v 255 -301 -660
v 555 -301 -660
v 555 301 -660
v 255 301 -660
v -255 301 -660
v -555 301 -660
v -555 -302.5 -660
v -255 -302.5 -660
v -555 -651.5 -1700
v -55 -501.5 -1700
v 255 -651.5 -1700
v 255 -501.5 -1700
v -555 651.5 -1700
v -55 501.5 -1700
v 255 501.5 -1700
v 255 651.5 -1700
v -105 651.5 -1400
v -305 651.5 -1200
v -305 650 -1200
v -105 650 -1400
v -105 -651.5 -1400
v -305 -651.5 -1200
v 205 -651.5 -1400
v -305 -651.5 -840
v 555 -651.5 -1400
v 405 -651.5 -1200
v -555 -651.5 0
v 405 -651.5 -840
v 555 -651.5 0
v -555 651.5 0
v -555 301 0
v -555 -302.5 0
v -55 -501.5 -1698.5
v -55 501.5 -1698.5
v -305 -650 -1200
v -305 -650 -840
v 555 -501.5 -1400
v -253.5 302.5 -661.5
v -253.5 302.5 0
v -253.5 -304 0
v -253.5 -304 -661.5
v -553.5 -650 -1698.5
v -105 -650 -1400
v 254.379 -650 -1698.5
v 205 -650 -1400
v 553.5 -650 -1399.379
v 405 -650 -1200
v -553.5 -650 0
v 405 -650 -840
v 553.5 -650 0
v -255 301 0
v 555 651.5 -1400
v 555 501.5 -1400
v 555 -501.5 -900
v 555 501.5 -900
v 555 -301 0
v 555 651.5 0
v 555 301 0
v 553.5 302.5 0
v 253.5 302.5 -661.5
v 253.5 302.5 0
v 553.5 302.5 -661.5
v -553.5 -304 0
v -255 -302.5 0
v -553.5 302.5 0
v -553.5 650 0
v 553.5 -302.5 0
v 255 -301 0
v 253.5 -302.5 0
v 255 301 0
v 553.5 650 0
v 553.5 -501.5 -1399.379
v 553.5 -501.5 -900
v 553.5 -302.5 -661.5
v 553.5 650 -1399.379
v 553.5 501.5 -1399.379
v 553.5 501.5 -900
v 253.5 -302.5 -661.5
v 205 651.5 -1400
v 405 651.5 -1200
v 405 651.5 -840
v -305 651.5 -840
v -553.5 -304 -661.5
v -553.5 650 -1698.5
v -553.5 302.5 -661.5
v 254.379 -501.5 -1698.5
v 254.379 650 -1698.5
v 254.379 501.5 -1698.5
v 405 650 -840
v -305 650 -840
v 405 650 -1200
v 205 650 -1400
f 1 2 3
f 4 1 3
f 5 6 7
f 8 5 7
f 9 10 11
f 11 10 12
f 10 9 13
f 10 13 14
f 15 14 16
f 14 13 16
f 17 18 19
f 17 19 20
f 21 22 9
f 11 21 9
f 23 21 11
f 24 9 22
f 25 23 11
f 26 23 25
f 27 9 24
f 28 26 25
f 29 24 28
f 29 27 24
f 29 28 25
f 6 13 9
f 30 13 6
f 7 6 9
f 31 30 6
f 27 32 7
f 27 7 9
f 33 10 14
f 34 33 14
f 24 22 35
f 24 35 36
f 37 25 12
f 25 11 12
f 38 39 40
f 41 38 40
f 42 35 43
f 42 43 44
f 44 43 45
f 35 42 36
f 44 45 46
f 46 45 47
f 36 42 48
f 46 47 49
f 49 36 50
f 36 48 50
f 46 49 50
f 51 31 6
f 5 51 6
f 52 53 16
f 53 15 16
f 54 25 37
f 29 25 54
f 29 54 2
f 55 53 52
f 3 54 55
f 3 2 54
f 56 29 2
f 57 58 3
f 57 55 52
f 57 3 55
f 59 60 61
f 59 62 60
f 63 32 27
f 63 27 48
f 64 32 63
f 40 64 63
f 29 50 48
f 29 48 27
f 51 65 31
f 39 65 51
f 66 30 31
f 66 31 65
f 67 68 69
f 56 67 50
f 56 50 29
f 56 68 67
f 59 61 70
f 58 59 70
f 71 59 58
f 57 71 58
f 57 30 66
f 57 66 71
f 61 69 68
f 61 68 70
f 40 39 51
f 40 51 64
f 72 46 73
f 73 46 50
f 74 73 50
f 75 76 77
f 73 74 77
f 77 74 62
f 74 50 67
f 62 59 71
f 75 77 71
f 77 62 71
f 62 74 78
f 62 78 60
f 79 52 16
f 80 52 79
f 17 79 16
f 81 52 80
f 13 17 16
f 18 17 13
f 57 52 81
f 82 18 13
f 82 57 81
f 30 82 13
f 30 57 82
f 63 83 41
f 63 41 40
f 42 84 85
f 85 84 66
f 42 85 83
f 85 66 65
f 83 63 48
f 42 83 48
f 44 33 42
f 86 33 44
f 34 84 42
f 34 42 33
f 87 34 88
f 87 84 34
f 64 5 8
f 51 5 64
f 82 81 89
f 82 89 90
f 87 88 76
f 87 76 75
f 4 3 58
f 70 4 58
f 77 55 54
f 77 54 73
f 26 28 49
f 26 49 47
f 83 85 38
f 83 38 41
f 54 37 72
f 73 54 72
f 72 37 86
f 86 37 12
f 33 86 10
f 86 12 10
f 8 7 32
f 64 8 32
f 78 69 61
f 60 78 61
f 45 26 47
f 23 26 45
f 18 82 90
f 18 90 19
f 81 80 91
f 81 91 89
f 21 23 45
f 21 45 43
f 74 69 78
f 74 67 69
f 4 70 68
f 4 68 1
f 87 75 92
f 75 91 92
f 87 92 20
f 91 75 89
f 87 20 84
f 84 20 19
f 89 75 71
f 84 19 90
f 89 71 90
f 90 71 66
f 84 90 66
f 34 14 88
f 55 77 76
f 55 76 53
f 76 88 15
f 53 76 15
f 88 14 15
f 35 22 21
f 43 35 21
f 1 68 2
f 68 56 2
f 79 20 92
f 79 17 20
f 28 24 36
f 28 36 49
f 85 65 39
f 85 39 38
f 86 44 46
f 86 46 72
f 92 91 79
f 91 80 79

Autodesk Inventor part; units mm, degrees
ref_plane "YZ Plane" through (0, 0, 0) normal (1, 0, 0) x (0, 1, 0)
ref_plane "XZ Plane" through (0, 0, 0) normal (0, 1, 0) x (-1, 0, 0)
ref_plane "XY Plane" through (0, 0, 0) normal (0, 0, 1) x (1, 0, 0)
sketch "Esboço1" plane through (0, 0, 0) normal (0, 0, 1) x (1, 0, 0)
  line L0 (555, 651.5) -> (-555, 651.5)
  line L1 (-555, 651.5) -> (-555, -651.5)
  line L2 (-555, -651.5) -> (555, -651.5)
  line L3 (555, -651.5) -> (555, 651.5)
  point P0 (0, 0)
  point P1 (555, 0)
  point P2 (0, 651.5)
  dimension "d11" = 1110
  dimension "d12" = 1303
extrude "Extrusão1" add sketch "Esboço1" against normal blind 1700
sketch "Esboço3" plane through (-555, -651.5, 0) normal (0, -1, 0) x (1, 0, 0)
  line L0 (960, -1400) -> (250, -1400)
  line L1 (250, -1400) -> (250, -840)
  line L2 (250, -840) -> (960, -840)
  line L3 (960, -840) -> (960, -1400)
  line L4 (1110, 0) -> (1110, -1700) construction
  line L5 (0, 0) -> (0, -1700) construction
  line L6 (1110, -1700) -> (0, -1700) projected
  line L7 (1110, 0) -> (0, 0) construction
  point P0 (555, 0)
  dimension "d2" = 150
  dimension "d3" = 250
  dimension "d4" = 300
  dimension "d10" = 560
  dimension "d17" = 840
extrude "Extrusão2" cut sketch "Esboço3" against normal through all
chamfer "Chanfro2" distance 300 angle 45 1 edges at (555, 0, -1700)
chamfer "Chanfro1" distance 200 angle 45 2 edges at (-305, 0, -1400) (405, 0, -1400)
sketch "Esboço4" plane through (555, -651.5, 0) normal (1, 0, 0) x (0, 0, -1)
  line L0 (0, 1303) -> (0, 0) projected
  line L1 (660, 952.5) -> (0, 952.5)
  line L2 (0, 952.5) -> (0, 350.5)
  line L3 (0, 350.5) -> (660, 350.5)
  line L4 (660, 350.5) -> (660, 952.5)
  line L5 (0, 1303) -> (1400, 1303) projected
  line L6 (0, 0) -> (1400, 0) projected
  point P0 (0, 651.5)
  point P1 (0, 952.5)
  dimension "d19" = 350.5
  dimension "d20" = 350.5
  dimension "d21" = 660
  dimension "d22" = 602
extrude "Extrusão3" cut sketch "Esboço4" against normal blind 300
sketch "Esboço6" plane through (-555, -651.5, 0) normal (-1, 0, 0) x (0, 0, 1)
  line L0 (-660, 349) -> (0, 349)
  line L1 (0, 349) -> (0, 954)
  line L2 (0, 954) -> (-660, 954)
  line L3 (-660, 954) -> (-660, 349)
  line L4 (0, 1303) -> (0, 0) projected
  line L5 (0, 952.5) -> (-660, 952.5) projected
  point P0 (0, 651.5)
  point P1 (0, 651.5)
  dimension "d30" = 660
  dimension "d31" = 660
  dimension "d32" = 605
extrude "Extrusão5" cut sketch "Esboço6" against normal blind 300 contours L3 L5 L1 L0
shell "Casca1" thickness 1.5 removed faces 7 at (85, 534.6667, 0) at (168.3333, -217.1667, -840) at (-305, 217.1667, -960) at (-238.3333, -217.1667, -1266.6667) at (-1.6667, -217.1667, -1400) at (405, -217.1667, -1080) at (271.6667, -217.1667, -1333.3333)
sketch "Esboço5" plane through (0, 0, -1700) normal (0, 0, -1) x (-1, 0, 0)
  line L0 (55, 501.5) -> (-555, 501.5)
  line L1 (-555, 501.5) -> (-555, -501.5)
  line L2 (-555, -501.5) -> (55, -501.5)
  line L3 (55, -501.5) -> (55, 501.5)
  line L4 (-255, 651.5) -> (-555, 651.5) construction
  line L5 (-255, -651.5) -> (555, -651.5) construction
  line L6 (-555, 651.5) -> (-555, -651.5) construction
  line L7 (555, -651.5) -> (555, 651.5) construction
  line L8 (555, 651.5) -> (-555, 651.5)
  line L9 (-555, 651.5) -> (-555, -651.5)
  line L10 (-555, -651.5) -> (555, -651.5)
  line L11 (555, -651.5) -> (555, 651.5)
  point P0 (0, 0)
  dimension "d25" = 150
  dimension "d26" = 150
  dimension "d27" = 500
extrude "Extrusão4" cut sketch "Esboço5" against normal blind 800 contours L3 L2 L1 L0
sketch "Esboço7" plane through (255, -651.5, 0) normal (1, 0, 0) x (0, 0, -1)
  line L0 (661.5, 349) -> (0, 349) construction
  line L1 (440, 952.5) -> (435, 952.5)
  line L2 (435, 952.5) -> (435, 349)
  line L3 (435, 349) -> (440, 349)
  line L4 (440, 349) -> (440, 952.5)
  line L5 (0, 952.5) -> (660, 952.5) construction
  line L6 (0, 350.5) -> (0, 952.5) construction
  line L7 (660, 350.5) -> (0, 350.5) construction
  line L8 (660, 952.5) -> (660, 350.5) construction
  line L9 (0, 952.5) -> (660, 952.5) projected
  line L10 (215, 952.5) -> (210, 952.5)
  line L11 (210, 952.5) -> (210, 350.5)
  line L12 (210, 350.5) -> (215, 350.5)
  line L13 (215, 350.5) -> (215, 952.5)
  point P0 (0, 651.5)
  point P1 (437.5, 952.5)
  dimension "d35" = 5
  dimension "d36" = 220
  dimension "d37" = 220
equation "\"d20\" = d19"
equation "\"d26\" = d25"
equation "\"d36\" = d37"
properties part number "Croqui Célula"
